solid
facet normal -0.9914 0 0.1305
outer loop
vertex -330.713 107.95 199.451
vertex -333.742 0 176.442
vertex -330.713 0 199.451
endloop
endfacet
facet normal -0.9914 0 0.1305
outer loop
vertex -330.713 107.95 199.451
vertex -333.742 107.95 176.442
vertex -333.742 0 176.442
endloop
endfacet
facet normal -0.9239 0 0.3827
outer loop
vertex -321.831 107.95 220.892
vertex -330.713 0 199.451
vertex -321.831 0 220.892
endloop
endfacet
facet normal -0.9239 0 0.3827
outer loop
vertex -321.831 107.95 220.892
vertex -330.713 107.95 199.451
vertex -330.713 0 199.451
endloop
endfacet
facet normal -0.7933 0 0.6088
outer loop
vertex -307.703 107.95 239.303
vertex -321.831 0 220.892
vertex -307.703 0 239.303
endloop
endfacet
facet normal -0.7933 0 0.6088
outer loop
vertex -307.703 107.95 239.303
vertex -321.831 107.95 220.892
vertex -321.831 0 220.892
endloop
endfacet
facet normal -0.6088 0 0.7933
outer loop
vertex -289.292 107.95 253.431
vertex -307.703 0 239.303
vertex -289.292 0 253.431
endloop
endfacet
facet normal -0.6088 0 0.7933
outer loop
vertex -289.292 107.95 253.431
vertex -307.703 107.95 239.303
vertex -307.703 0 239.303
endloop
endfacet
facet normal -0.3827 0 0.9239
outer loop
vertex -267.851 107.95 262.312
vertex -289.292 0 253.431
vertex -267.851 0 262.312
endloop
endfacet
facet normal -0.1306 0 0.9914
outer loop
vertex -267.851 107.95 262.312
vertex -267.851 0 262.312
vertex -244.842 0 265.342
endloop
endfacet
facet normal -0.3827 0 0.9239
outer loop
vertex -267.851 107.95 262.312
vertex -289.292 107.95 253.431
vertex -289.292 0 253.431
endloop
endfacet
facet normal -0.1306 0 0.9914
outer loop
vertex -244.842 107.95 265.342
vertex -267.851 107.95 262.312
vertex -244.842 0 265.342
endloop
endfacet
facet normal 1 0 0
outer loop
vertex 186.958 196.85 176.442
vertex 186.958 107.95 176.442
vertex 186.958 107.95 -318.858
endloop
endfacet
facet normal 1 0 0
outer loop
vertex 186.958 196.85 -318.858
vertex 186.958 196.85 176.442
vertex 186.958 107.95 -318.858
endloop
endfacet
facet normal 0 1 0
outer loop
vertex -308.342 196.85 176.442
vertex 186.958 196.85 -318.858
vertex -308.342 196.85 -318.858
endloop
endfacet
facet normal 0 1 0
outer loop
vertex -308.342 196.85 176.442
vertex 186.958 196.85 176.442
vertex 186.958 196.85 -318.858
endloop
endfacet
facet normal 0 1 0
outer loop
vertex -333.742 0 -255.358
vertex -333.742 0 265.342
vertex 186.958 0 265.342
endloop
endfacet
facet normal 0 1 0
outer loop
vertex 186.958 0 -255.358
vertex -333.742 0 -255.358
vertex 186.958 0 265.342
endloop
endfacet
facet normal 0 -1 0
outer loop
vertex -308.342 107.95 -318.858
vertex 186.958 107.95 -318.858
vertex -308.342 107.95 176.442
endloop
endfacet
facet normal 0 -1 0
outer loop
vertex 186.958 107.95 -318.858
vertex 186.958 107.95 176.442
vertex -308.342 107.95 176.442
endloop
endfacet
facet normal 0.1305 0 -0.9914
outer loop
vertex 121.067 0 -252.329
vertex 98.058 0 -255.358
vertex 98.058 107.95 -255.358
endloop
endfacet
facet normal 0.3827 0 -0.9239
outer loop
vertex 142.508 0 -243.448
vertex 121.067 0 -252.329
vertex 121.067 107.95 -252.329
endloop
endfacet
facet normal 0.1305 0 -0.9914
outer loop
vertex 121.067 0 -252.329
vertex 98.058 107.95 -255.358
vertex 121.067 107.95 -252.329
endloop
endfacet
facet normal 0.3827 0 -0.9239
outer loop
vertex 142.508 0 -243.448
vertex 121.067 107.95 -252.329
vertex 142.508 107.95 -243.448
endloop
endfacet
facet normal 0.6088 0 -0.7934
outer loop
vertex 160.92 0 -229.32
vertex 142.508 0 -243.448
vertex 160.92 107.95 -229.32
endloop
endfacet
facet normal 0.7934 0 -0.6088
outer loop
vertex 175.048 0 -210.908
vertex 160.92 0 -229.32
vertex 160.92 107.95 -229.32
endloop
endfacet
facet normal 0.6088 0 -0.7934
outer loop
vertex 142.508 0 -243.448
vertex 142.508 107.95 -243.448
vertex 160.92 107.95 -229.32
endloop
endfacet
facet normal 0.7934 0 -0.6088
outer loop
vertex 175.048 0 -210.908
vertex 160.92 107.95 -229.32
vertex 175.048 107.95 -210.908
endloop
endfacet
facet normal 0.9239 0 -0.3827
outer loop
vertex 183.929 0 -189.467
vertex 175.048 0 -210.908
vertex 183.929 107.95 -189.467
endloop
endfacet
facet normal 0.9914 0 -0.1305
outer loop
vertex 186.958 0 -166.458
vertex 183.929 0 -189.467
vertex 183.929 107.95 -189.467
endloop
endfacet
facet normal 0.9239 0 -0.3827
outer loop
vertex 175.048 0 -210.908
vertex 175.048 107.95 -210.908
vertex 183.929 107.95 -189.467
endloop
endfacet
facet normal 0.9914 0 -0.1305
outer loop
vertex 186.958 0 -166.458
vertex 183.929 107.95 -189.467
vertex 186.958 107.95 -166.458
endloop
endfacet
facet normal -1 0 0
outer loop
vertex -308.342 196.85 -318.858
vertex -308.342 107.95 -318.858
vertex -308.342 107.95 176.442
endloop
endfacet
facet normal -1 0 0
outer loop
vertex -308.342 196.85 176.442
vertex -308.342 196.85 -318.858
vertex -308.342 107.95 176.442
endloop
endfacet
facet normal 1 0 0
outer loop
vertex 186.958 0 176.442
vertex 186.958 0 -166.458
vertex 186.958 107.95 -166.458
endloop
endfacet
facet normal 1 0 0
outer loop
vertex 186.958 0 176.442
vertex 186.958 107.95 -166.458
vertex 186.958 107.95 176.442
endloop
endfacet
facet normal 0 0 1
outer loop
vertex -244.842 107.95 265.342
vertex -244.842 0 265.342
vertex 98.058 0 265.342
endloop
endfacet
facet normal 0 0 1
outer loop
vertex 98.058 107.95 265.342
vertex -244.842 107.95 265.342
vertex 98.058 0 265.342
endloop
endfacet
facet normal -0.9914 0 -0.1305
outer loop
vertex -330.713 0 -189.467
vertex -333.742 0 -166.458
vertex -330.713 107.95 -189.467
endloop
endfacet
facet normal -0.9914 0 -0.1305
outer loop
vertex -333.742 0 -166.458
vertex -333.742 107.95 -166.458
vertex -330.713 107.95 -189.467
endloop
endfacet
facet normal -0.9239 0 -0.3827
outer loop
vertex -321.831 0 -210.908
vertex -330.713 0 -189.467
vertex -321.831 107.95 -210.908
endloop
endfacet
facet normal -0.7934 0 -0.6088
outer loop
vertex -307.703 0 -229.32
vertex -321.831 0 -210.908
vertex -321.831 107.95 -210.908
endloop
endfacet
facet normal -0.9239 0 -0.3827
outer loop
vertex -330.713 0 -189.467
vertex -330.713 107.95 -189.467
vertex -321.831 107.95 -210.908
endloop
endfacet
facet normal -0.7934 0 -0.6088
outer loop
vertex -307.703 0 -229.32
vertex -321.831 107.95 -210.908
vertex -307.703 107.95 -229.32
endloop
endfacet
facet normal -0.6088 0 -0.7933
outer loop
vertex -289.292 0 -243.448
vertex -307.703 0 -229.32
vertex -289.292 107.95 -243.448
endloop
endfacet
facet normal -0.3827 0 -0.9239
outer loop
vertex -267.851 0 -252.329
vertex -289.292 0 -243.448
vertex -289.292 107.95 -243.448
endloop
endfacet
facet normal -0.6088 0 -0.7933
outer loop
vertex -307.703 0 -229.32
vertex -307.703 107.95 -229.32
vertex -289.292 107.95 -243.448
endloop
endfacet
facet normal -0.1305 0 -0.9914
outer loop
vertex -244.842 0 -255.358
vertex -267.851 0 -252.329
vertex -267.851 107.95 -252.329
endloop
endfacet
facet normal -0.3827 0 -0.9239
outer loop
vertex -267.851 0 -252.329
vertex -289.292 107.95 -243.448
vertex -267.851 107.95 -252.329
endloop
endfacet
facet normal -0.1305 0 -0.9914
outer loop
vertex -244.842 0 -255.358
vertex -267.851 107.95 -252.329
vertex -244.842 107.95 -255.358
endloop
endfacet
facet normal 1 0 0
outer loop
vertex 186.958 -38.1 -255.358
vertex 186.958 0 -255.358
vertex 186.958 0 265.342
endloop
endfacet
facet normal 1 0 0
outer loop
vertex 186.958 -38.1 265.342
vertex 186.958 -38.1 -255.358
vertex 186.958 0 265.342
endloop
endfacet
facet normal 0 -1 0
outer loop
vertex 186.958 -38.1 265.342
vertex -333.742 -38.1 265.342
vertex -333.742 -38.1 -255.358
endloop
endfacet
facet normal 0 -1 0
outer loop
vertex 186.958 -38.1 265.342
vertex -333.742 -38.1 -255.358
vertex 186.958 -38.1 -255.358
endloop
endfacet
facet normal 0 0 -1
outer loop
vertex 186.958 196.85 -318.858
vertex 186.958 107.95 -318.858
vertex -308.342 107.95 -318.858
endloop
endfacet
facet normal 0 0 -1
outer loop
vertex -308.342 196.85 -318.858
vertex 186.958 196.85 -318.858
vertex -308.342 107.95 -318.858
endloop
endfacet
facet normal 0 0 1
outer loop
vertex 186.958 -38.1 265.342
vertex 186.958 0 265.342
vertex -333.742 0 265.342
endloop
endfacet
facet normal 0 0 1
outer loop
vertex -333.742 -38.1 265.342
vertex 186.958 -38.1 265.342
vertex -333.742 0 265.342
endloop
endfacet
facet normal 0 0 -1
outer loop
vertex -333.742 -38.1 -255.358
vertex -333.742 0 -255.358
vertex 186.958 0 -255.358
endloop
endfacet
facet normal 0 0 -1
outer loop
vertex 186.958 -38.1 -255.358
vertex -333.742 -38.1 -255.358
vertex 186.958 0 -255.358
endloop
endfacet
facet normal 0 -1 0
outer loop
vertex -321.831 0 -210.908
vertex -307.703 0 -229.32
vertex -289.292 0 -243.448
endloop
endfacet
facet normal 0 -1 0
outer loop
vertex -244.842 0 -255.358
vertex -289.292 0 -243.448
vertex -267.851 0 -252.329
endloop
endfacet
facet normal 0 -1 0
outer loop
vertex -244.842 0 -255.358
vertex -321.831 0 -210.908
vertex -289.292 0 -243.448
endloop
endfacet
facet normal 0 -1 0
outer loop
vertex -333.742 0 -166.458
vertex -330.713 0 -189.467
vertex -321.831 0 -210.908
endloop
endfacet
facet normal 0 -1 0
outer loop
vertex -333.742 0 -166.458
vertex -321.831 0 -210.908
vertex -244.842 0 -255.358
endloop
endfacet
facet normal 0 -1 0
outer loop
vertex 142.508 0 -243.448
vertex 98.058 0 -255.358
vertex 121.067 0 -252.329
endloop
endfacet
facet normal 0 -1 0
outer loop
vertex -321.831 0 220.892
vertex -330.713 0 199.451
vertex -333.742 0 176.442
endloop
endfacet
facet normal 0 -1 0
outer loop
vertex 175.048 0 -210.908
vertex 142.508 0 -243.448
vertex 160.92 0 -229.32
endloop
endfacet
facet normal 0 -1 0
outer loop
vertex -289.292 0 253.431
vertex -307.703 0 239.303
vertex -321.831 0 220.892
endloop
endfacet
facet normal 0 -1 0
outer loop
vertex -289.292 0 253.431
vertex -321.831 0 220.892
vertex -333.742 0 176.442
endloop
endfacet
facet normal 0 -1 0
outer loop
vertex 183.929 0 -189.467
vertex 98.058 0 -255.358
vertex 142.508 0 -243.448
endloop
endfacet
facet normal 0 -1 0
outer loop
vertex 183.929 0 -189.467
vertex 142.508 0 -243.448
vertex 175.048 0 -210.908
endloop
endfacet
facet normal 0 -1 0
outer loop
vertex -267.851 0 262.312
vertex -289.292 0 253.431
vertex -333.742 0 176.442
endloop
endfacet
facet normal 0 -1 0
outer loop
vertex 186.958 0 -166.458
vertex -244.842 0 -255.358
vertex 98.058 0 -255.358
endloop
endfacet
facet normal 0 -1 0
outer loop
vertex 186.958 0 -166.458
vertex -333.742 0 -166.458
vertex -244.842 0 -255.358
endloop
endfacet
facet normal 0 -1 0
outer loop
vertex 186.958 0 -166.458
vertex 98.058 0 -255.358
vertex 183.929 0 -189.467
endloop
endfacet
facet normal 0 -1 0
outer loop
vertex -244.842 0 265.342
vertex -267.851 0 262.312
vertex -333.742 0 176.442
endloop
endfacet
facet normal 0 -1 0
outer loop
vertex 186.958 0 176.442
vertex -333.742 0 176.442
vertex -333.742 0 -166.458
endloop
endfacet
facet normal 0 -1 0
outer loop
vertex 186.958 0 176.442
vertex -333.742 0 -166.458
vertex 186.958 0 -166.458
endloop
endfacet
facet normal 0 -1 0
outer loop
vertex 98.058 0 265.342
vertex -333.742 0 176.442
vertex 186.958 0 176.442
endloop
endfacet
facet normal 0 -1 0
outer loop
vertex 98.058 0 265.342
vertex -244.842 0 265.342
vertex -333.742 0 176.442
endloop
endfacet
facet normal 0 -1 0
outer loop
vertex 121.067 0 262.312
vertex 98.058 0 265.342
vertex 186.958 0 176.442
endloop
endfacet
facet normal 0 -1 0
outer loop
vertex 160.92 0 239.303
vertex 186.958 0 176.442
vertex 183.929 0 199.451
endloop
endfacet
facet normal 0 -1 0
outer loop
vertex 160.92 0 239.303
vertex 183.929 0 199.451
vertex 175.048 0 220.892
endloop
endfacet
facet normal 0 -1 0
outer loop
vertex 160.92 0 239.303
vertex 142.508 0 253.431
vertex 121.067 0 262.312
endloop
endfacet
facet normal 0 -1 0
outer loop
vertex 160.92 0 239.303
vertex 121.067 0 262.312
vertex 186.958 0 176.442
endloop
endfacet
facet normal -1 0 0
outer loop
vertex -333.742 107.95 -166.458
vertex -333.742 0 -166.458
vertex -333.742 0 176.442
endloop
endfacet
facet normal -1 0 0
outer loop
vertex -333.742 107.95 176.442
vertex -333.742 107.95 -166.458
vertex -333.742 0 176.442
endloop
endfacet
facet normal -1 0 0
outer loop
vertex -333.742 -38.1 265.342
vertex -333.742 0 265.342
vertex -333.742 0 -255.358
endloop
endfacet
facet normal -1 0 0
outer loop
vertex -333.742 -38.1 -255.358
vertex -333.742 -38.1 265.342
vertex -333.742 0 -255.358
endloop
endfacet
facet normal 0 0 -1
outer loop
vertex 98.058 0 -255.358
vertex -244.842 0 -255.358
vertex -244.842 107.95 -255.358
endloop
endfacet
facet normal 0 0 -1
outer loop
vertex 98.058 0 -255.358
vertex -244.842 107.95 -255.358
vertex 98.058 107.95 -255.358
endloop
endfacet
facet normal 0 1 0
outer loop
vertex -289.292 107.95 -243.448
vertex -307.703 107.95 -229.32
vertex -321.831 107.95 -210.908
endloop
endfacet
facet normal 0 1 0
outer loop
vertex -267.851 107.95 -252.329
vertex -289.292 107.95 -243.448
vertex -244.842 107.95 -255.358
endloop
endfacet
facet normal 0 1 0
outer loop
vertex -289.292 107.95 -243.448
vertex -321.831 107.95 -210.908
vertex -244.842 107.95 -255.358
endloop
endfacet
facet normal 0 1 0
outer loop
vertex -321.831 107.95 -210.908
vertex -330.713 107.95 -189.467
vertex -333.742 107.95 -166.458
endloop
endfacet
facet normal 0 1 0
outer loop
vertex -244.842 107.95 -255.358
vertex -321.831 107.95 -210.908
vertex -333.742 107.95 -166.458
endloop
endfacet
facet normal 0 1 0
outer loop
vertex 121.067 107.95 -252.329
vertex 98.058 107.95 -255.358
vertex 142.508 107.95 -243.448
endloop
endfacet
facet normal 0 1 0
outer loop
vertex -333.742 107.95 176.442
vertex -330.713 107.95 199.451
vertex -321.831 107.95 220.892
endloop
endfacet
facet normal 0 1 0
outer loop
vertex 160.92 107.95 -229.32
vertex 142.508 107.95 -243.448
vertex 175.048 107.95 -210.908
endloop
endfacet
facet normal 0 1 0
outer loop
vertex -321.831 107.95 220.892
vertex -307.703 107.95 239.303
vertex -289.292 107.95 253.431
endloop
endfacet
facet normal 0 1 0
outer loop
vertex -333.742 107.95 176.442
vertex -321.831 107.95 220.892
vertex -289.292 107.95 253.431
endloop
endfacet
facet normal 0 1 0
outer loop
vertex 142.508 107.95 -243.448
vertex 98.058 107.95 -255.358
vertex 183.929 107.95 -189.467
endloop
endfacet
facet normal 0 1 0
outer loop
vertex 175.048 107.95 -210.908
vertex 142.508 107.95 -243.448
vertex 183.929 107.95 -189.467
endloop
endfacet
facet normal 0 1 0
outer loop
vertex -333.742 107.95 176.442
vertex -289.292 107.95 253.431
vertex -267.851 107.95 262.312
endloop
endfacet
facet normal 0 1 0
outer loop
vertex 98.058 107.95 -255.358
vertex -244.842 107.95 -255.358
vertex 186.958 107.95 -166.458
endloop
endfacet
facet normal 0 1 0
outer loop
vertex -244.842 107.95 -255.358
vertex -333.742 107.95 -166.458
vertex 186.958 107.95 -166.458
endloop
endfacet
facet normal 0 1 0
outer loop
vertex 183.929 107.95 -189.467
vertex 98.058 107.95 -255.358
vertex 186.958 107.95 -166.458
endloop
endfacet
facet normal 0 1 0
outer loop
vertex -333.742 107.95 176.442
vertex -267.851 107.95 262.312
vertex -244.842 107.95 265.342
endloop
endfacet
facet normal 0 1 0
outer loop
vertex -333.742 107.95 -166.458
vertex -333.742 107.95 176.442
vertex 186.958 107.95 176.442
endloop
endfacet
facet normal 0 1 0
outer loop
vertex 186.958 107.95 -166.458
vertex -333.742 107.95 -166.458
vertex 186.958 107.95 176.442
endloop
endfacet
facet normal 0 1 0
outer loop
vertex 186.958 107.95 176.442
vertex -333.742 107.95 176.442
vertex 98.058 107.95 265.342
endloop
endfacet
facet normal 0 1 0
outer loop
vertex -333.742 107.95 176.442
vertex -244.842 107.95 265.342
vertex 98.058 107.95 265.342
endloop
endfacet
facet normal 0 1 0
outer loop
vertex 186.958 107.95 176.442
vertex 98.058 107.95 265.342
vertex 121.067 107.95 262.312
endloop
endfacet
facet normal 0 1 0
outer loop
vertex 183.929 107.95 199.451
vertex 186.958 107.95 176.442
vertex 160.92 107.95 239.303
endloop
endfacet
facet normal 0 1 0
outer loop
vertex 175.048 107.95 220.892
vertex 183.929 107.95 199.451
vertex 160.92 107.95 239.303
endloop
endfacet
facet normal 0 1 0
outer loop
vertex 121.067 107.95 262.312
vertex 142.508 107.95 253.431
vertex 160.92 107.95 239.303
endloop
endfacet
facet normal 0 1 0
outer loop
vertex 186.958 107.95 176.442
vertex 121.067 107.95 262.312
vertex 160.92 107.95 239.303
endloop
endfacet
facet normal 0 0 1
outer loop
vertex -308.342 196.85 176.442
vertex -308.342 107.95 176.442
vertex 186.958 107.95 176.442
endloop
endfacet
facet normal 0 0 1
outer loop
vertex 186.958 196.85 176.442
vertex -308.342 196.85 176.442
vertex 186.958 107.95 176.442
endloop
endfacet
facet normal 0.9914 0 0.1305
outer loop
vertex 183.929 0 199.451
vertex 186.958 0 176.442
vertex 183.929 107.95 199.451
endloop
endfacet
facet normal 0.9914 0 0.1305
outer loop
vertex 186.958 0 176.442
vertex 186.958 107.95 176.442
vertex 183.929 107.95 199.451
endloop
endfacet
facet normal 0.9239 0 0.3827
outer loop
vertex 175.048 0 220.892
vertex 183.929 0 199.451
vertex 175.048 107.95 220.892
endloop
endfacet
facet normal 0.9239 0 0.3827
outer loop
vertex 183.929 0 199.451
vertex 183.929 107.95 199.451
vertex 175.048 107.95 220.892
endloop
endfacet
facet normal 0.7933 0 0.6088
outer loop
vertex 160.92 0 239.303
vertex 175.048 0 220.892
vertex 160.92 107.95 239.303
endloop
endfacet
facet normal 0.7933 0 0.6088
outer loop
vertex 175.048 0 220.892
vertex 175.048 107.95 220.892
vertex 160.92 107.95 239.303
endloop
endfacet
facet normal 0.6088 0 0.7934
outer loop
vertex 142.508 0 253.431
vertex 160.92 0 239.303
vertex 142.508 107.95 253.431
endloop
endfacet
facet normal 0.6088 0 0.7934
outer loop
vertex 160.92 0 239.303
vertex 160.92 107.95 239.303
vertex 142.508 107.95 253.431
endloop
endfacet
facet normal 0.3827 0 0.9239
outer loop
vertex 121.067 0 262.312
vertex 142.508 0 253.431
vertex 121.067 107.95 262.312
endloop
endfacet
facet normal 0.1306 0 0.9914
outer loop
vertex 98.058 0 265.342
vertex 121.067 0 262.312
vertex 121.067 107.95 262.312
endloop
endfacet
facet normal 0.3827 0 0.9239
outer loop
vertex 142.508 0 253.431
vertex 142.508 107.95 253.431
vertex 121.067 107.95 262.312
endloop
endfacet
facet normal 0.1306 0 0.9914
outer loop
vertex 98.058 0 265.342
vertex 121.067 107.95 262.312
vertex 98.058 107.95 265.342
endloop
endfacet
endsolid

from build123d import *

# Parameters (mm, degrees)
F0_W     = 520.7
F0_H     = 520.7
F1_DEPTH = 107.95
F2_R     = 88.9
F4_DEPTH = 88.9
F6_DEPTH = 38.1


with BuildPart() as f1:
    # F0 (on Front) → F1 (new body)
    with BuildSketch(Plane.XZ):
        with Locations((-73.391706044, 4.9916096032)):
            Rectangle(F0_W, F0_H)
    extrude(amount=-F1_DEPTH)

    # F2
    f2_edges = [f1.edges().sort_by_distance(p)[0] for p in [
        (186.958294, 53.975, 265.34161),
        (186.958294, 53.975, -255.35839),
        (-333.741706, 53.975, -255.35839),
        (-333.741706, 53.975, 265.34161),
    ]]
    fillet(f2_edges, radius=F2_R)


with BuildPart() as f4:
    # F3 (on face) → F4 (new body)
    with BuildSketch(Plane(origin=(0, 107.95, 0), x_dir=(-1, 0, 0), z_dir=(0, 1, 0))):
        with BuildLine():
            ThreePointArc((-98.058293956, -255.3583903968), (-160.9200868035, -229.3201832443), (-186.958293956, -166.4583903968))
            Line((-186.958293956, -166.4583903968), (-186.958293956, -318.8583903968))
            Line((-186.958293956, -318.8583903968), (308.341706044, -318.8583903968))
            Line((308.341706044, -318.8583903968), (308.341706044, -228.6754298635))
            ThreePointArc((308.341706044, -228.6754298635), (279.280892964, -248.4166261288), (244.841706044, -255.3583903968))
            Line((244.841706044, -255.3583903968), (-98.058293956, -255.3583903968))
        make_face()
        with BuildLine():
            Line((308.341706044, 176.4416096032), (-186.958293956, 176.4416096032))
            Line((-186.958293956, 176.4416096032), (-186.958293956, -166.4583903968))
            ThreePointArc((-186.958293956, -166.4583903968), (-160.9200868035, -229.3201832443), (-98.058293956, -255.3583903968))
            Line((-98.058293956, -255.3583903968), (244.841706044, -255.3583903968))
            ThreePointArc((244.841706044, -255.3583903968), (279.280892964, -248.4166261288), (308.341706044, -228.6754298635))
            Line((308.341706044, -228.6754298635), (308.341706044, 176.4416096032))
        make_face()
    extrude(amount=F4_DEPTH)


with BuildPart() as f6:
    # F5 (on face) → F6 (new body)
    with BuildSketch(Plane.XZ):
        with BuildLine():
            ThreePointArc((186.958293956, -166.4583903968), (160.9200868035, -229.3201832443), (98.058293956, -255.3583903968))
            Line((98.058293956, -255.3583903968), (186.958293956, -255.3583903968))
            Line((186.958293956, -255.3583903968), (186.958293956, -166.4583903968))
        make_face()
        with BuildLine():
            ThreePointArc((-333.741706044, -166.4583903968), (-307.7034988915, -229.3201832443), (-244.841706044, -255.3583903968))
            Line((-244.841706044, -255.3583903968), (98.058293956, -255.3583903968))
            ThreePointArc((98.058293956, -255.3583903968), (160.9200868035, -229.3201832443), (186.958293956, -166.4583903968))
            Line((186.958293956, -166.4583903968), (186.958293956, 176.4416096032))
            ThreePointArc((186.958293956, 176.4416096032), (160.9200868035, 239.3034024507), (98.058293956, 265.3416096032))
            Line((98.058293956, 265.3416096032), (-244.841706044, 265.3416096032))
            ThreePointArc((-244.841706044, 265.3416096032), (-307.7034988915, 239.3034024507), (-333.741706044, 176.4416096032))
            Line((-333.741706044, 176.4416096032), (-333.741706044, -166.4583903968))
        make_face()
        with BuildLine():
            ThreePointArc((98.058293956, 265.3416096032), (160.9200868035, 239.3034024507), (186.958293956, 176.4416096032))
            Line((186.958293956, 176.4416096032), (186.958293956, 265.3416096032))
            Line((186.958293956, 265.3416096032), (98.058293956, 265.3416096032))
        make_face()
        with BuildLine():
            Line((-333.741706044, -166.4583903968), (-333.741706044, -255.3583903968))
            Line((-333.741706044, -255.3583903968), (-244.841706044, -255.3583903968))
            ThreePointArc((-244.841706044, -255.3583903968), (-307.7034988915, -229.3201832443), (-333.741706044, -166.4583903968))
        make_face()
        with BuildLine():
            Line((-333.741706044, 265.3416096032), (-333.741706044, 176.4416096032))
            ThreePointArc((-333.741706044, 176.4416096032), (-307.7034988915, 239.3034024507), (-244.841706044, 265.3416096032))
            Line((-244.841706044, 265.3416096032), (-333.741706044, 265.3416096032))
        make_face()
    extrude(amount=F6_DEPTH)


solid = Compound([f1.part, f4.part, f6.part])
